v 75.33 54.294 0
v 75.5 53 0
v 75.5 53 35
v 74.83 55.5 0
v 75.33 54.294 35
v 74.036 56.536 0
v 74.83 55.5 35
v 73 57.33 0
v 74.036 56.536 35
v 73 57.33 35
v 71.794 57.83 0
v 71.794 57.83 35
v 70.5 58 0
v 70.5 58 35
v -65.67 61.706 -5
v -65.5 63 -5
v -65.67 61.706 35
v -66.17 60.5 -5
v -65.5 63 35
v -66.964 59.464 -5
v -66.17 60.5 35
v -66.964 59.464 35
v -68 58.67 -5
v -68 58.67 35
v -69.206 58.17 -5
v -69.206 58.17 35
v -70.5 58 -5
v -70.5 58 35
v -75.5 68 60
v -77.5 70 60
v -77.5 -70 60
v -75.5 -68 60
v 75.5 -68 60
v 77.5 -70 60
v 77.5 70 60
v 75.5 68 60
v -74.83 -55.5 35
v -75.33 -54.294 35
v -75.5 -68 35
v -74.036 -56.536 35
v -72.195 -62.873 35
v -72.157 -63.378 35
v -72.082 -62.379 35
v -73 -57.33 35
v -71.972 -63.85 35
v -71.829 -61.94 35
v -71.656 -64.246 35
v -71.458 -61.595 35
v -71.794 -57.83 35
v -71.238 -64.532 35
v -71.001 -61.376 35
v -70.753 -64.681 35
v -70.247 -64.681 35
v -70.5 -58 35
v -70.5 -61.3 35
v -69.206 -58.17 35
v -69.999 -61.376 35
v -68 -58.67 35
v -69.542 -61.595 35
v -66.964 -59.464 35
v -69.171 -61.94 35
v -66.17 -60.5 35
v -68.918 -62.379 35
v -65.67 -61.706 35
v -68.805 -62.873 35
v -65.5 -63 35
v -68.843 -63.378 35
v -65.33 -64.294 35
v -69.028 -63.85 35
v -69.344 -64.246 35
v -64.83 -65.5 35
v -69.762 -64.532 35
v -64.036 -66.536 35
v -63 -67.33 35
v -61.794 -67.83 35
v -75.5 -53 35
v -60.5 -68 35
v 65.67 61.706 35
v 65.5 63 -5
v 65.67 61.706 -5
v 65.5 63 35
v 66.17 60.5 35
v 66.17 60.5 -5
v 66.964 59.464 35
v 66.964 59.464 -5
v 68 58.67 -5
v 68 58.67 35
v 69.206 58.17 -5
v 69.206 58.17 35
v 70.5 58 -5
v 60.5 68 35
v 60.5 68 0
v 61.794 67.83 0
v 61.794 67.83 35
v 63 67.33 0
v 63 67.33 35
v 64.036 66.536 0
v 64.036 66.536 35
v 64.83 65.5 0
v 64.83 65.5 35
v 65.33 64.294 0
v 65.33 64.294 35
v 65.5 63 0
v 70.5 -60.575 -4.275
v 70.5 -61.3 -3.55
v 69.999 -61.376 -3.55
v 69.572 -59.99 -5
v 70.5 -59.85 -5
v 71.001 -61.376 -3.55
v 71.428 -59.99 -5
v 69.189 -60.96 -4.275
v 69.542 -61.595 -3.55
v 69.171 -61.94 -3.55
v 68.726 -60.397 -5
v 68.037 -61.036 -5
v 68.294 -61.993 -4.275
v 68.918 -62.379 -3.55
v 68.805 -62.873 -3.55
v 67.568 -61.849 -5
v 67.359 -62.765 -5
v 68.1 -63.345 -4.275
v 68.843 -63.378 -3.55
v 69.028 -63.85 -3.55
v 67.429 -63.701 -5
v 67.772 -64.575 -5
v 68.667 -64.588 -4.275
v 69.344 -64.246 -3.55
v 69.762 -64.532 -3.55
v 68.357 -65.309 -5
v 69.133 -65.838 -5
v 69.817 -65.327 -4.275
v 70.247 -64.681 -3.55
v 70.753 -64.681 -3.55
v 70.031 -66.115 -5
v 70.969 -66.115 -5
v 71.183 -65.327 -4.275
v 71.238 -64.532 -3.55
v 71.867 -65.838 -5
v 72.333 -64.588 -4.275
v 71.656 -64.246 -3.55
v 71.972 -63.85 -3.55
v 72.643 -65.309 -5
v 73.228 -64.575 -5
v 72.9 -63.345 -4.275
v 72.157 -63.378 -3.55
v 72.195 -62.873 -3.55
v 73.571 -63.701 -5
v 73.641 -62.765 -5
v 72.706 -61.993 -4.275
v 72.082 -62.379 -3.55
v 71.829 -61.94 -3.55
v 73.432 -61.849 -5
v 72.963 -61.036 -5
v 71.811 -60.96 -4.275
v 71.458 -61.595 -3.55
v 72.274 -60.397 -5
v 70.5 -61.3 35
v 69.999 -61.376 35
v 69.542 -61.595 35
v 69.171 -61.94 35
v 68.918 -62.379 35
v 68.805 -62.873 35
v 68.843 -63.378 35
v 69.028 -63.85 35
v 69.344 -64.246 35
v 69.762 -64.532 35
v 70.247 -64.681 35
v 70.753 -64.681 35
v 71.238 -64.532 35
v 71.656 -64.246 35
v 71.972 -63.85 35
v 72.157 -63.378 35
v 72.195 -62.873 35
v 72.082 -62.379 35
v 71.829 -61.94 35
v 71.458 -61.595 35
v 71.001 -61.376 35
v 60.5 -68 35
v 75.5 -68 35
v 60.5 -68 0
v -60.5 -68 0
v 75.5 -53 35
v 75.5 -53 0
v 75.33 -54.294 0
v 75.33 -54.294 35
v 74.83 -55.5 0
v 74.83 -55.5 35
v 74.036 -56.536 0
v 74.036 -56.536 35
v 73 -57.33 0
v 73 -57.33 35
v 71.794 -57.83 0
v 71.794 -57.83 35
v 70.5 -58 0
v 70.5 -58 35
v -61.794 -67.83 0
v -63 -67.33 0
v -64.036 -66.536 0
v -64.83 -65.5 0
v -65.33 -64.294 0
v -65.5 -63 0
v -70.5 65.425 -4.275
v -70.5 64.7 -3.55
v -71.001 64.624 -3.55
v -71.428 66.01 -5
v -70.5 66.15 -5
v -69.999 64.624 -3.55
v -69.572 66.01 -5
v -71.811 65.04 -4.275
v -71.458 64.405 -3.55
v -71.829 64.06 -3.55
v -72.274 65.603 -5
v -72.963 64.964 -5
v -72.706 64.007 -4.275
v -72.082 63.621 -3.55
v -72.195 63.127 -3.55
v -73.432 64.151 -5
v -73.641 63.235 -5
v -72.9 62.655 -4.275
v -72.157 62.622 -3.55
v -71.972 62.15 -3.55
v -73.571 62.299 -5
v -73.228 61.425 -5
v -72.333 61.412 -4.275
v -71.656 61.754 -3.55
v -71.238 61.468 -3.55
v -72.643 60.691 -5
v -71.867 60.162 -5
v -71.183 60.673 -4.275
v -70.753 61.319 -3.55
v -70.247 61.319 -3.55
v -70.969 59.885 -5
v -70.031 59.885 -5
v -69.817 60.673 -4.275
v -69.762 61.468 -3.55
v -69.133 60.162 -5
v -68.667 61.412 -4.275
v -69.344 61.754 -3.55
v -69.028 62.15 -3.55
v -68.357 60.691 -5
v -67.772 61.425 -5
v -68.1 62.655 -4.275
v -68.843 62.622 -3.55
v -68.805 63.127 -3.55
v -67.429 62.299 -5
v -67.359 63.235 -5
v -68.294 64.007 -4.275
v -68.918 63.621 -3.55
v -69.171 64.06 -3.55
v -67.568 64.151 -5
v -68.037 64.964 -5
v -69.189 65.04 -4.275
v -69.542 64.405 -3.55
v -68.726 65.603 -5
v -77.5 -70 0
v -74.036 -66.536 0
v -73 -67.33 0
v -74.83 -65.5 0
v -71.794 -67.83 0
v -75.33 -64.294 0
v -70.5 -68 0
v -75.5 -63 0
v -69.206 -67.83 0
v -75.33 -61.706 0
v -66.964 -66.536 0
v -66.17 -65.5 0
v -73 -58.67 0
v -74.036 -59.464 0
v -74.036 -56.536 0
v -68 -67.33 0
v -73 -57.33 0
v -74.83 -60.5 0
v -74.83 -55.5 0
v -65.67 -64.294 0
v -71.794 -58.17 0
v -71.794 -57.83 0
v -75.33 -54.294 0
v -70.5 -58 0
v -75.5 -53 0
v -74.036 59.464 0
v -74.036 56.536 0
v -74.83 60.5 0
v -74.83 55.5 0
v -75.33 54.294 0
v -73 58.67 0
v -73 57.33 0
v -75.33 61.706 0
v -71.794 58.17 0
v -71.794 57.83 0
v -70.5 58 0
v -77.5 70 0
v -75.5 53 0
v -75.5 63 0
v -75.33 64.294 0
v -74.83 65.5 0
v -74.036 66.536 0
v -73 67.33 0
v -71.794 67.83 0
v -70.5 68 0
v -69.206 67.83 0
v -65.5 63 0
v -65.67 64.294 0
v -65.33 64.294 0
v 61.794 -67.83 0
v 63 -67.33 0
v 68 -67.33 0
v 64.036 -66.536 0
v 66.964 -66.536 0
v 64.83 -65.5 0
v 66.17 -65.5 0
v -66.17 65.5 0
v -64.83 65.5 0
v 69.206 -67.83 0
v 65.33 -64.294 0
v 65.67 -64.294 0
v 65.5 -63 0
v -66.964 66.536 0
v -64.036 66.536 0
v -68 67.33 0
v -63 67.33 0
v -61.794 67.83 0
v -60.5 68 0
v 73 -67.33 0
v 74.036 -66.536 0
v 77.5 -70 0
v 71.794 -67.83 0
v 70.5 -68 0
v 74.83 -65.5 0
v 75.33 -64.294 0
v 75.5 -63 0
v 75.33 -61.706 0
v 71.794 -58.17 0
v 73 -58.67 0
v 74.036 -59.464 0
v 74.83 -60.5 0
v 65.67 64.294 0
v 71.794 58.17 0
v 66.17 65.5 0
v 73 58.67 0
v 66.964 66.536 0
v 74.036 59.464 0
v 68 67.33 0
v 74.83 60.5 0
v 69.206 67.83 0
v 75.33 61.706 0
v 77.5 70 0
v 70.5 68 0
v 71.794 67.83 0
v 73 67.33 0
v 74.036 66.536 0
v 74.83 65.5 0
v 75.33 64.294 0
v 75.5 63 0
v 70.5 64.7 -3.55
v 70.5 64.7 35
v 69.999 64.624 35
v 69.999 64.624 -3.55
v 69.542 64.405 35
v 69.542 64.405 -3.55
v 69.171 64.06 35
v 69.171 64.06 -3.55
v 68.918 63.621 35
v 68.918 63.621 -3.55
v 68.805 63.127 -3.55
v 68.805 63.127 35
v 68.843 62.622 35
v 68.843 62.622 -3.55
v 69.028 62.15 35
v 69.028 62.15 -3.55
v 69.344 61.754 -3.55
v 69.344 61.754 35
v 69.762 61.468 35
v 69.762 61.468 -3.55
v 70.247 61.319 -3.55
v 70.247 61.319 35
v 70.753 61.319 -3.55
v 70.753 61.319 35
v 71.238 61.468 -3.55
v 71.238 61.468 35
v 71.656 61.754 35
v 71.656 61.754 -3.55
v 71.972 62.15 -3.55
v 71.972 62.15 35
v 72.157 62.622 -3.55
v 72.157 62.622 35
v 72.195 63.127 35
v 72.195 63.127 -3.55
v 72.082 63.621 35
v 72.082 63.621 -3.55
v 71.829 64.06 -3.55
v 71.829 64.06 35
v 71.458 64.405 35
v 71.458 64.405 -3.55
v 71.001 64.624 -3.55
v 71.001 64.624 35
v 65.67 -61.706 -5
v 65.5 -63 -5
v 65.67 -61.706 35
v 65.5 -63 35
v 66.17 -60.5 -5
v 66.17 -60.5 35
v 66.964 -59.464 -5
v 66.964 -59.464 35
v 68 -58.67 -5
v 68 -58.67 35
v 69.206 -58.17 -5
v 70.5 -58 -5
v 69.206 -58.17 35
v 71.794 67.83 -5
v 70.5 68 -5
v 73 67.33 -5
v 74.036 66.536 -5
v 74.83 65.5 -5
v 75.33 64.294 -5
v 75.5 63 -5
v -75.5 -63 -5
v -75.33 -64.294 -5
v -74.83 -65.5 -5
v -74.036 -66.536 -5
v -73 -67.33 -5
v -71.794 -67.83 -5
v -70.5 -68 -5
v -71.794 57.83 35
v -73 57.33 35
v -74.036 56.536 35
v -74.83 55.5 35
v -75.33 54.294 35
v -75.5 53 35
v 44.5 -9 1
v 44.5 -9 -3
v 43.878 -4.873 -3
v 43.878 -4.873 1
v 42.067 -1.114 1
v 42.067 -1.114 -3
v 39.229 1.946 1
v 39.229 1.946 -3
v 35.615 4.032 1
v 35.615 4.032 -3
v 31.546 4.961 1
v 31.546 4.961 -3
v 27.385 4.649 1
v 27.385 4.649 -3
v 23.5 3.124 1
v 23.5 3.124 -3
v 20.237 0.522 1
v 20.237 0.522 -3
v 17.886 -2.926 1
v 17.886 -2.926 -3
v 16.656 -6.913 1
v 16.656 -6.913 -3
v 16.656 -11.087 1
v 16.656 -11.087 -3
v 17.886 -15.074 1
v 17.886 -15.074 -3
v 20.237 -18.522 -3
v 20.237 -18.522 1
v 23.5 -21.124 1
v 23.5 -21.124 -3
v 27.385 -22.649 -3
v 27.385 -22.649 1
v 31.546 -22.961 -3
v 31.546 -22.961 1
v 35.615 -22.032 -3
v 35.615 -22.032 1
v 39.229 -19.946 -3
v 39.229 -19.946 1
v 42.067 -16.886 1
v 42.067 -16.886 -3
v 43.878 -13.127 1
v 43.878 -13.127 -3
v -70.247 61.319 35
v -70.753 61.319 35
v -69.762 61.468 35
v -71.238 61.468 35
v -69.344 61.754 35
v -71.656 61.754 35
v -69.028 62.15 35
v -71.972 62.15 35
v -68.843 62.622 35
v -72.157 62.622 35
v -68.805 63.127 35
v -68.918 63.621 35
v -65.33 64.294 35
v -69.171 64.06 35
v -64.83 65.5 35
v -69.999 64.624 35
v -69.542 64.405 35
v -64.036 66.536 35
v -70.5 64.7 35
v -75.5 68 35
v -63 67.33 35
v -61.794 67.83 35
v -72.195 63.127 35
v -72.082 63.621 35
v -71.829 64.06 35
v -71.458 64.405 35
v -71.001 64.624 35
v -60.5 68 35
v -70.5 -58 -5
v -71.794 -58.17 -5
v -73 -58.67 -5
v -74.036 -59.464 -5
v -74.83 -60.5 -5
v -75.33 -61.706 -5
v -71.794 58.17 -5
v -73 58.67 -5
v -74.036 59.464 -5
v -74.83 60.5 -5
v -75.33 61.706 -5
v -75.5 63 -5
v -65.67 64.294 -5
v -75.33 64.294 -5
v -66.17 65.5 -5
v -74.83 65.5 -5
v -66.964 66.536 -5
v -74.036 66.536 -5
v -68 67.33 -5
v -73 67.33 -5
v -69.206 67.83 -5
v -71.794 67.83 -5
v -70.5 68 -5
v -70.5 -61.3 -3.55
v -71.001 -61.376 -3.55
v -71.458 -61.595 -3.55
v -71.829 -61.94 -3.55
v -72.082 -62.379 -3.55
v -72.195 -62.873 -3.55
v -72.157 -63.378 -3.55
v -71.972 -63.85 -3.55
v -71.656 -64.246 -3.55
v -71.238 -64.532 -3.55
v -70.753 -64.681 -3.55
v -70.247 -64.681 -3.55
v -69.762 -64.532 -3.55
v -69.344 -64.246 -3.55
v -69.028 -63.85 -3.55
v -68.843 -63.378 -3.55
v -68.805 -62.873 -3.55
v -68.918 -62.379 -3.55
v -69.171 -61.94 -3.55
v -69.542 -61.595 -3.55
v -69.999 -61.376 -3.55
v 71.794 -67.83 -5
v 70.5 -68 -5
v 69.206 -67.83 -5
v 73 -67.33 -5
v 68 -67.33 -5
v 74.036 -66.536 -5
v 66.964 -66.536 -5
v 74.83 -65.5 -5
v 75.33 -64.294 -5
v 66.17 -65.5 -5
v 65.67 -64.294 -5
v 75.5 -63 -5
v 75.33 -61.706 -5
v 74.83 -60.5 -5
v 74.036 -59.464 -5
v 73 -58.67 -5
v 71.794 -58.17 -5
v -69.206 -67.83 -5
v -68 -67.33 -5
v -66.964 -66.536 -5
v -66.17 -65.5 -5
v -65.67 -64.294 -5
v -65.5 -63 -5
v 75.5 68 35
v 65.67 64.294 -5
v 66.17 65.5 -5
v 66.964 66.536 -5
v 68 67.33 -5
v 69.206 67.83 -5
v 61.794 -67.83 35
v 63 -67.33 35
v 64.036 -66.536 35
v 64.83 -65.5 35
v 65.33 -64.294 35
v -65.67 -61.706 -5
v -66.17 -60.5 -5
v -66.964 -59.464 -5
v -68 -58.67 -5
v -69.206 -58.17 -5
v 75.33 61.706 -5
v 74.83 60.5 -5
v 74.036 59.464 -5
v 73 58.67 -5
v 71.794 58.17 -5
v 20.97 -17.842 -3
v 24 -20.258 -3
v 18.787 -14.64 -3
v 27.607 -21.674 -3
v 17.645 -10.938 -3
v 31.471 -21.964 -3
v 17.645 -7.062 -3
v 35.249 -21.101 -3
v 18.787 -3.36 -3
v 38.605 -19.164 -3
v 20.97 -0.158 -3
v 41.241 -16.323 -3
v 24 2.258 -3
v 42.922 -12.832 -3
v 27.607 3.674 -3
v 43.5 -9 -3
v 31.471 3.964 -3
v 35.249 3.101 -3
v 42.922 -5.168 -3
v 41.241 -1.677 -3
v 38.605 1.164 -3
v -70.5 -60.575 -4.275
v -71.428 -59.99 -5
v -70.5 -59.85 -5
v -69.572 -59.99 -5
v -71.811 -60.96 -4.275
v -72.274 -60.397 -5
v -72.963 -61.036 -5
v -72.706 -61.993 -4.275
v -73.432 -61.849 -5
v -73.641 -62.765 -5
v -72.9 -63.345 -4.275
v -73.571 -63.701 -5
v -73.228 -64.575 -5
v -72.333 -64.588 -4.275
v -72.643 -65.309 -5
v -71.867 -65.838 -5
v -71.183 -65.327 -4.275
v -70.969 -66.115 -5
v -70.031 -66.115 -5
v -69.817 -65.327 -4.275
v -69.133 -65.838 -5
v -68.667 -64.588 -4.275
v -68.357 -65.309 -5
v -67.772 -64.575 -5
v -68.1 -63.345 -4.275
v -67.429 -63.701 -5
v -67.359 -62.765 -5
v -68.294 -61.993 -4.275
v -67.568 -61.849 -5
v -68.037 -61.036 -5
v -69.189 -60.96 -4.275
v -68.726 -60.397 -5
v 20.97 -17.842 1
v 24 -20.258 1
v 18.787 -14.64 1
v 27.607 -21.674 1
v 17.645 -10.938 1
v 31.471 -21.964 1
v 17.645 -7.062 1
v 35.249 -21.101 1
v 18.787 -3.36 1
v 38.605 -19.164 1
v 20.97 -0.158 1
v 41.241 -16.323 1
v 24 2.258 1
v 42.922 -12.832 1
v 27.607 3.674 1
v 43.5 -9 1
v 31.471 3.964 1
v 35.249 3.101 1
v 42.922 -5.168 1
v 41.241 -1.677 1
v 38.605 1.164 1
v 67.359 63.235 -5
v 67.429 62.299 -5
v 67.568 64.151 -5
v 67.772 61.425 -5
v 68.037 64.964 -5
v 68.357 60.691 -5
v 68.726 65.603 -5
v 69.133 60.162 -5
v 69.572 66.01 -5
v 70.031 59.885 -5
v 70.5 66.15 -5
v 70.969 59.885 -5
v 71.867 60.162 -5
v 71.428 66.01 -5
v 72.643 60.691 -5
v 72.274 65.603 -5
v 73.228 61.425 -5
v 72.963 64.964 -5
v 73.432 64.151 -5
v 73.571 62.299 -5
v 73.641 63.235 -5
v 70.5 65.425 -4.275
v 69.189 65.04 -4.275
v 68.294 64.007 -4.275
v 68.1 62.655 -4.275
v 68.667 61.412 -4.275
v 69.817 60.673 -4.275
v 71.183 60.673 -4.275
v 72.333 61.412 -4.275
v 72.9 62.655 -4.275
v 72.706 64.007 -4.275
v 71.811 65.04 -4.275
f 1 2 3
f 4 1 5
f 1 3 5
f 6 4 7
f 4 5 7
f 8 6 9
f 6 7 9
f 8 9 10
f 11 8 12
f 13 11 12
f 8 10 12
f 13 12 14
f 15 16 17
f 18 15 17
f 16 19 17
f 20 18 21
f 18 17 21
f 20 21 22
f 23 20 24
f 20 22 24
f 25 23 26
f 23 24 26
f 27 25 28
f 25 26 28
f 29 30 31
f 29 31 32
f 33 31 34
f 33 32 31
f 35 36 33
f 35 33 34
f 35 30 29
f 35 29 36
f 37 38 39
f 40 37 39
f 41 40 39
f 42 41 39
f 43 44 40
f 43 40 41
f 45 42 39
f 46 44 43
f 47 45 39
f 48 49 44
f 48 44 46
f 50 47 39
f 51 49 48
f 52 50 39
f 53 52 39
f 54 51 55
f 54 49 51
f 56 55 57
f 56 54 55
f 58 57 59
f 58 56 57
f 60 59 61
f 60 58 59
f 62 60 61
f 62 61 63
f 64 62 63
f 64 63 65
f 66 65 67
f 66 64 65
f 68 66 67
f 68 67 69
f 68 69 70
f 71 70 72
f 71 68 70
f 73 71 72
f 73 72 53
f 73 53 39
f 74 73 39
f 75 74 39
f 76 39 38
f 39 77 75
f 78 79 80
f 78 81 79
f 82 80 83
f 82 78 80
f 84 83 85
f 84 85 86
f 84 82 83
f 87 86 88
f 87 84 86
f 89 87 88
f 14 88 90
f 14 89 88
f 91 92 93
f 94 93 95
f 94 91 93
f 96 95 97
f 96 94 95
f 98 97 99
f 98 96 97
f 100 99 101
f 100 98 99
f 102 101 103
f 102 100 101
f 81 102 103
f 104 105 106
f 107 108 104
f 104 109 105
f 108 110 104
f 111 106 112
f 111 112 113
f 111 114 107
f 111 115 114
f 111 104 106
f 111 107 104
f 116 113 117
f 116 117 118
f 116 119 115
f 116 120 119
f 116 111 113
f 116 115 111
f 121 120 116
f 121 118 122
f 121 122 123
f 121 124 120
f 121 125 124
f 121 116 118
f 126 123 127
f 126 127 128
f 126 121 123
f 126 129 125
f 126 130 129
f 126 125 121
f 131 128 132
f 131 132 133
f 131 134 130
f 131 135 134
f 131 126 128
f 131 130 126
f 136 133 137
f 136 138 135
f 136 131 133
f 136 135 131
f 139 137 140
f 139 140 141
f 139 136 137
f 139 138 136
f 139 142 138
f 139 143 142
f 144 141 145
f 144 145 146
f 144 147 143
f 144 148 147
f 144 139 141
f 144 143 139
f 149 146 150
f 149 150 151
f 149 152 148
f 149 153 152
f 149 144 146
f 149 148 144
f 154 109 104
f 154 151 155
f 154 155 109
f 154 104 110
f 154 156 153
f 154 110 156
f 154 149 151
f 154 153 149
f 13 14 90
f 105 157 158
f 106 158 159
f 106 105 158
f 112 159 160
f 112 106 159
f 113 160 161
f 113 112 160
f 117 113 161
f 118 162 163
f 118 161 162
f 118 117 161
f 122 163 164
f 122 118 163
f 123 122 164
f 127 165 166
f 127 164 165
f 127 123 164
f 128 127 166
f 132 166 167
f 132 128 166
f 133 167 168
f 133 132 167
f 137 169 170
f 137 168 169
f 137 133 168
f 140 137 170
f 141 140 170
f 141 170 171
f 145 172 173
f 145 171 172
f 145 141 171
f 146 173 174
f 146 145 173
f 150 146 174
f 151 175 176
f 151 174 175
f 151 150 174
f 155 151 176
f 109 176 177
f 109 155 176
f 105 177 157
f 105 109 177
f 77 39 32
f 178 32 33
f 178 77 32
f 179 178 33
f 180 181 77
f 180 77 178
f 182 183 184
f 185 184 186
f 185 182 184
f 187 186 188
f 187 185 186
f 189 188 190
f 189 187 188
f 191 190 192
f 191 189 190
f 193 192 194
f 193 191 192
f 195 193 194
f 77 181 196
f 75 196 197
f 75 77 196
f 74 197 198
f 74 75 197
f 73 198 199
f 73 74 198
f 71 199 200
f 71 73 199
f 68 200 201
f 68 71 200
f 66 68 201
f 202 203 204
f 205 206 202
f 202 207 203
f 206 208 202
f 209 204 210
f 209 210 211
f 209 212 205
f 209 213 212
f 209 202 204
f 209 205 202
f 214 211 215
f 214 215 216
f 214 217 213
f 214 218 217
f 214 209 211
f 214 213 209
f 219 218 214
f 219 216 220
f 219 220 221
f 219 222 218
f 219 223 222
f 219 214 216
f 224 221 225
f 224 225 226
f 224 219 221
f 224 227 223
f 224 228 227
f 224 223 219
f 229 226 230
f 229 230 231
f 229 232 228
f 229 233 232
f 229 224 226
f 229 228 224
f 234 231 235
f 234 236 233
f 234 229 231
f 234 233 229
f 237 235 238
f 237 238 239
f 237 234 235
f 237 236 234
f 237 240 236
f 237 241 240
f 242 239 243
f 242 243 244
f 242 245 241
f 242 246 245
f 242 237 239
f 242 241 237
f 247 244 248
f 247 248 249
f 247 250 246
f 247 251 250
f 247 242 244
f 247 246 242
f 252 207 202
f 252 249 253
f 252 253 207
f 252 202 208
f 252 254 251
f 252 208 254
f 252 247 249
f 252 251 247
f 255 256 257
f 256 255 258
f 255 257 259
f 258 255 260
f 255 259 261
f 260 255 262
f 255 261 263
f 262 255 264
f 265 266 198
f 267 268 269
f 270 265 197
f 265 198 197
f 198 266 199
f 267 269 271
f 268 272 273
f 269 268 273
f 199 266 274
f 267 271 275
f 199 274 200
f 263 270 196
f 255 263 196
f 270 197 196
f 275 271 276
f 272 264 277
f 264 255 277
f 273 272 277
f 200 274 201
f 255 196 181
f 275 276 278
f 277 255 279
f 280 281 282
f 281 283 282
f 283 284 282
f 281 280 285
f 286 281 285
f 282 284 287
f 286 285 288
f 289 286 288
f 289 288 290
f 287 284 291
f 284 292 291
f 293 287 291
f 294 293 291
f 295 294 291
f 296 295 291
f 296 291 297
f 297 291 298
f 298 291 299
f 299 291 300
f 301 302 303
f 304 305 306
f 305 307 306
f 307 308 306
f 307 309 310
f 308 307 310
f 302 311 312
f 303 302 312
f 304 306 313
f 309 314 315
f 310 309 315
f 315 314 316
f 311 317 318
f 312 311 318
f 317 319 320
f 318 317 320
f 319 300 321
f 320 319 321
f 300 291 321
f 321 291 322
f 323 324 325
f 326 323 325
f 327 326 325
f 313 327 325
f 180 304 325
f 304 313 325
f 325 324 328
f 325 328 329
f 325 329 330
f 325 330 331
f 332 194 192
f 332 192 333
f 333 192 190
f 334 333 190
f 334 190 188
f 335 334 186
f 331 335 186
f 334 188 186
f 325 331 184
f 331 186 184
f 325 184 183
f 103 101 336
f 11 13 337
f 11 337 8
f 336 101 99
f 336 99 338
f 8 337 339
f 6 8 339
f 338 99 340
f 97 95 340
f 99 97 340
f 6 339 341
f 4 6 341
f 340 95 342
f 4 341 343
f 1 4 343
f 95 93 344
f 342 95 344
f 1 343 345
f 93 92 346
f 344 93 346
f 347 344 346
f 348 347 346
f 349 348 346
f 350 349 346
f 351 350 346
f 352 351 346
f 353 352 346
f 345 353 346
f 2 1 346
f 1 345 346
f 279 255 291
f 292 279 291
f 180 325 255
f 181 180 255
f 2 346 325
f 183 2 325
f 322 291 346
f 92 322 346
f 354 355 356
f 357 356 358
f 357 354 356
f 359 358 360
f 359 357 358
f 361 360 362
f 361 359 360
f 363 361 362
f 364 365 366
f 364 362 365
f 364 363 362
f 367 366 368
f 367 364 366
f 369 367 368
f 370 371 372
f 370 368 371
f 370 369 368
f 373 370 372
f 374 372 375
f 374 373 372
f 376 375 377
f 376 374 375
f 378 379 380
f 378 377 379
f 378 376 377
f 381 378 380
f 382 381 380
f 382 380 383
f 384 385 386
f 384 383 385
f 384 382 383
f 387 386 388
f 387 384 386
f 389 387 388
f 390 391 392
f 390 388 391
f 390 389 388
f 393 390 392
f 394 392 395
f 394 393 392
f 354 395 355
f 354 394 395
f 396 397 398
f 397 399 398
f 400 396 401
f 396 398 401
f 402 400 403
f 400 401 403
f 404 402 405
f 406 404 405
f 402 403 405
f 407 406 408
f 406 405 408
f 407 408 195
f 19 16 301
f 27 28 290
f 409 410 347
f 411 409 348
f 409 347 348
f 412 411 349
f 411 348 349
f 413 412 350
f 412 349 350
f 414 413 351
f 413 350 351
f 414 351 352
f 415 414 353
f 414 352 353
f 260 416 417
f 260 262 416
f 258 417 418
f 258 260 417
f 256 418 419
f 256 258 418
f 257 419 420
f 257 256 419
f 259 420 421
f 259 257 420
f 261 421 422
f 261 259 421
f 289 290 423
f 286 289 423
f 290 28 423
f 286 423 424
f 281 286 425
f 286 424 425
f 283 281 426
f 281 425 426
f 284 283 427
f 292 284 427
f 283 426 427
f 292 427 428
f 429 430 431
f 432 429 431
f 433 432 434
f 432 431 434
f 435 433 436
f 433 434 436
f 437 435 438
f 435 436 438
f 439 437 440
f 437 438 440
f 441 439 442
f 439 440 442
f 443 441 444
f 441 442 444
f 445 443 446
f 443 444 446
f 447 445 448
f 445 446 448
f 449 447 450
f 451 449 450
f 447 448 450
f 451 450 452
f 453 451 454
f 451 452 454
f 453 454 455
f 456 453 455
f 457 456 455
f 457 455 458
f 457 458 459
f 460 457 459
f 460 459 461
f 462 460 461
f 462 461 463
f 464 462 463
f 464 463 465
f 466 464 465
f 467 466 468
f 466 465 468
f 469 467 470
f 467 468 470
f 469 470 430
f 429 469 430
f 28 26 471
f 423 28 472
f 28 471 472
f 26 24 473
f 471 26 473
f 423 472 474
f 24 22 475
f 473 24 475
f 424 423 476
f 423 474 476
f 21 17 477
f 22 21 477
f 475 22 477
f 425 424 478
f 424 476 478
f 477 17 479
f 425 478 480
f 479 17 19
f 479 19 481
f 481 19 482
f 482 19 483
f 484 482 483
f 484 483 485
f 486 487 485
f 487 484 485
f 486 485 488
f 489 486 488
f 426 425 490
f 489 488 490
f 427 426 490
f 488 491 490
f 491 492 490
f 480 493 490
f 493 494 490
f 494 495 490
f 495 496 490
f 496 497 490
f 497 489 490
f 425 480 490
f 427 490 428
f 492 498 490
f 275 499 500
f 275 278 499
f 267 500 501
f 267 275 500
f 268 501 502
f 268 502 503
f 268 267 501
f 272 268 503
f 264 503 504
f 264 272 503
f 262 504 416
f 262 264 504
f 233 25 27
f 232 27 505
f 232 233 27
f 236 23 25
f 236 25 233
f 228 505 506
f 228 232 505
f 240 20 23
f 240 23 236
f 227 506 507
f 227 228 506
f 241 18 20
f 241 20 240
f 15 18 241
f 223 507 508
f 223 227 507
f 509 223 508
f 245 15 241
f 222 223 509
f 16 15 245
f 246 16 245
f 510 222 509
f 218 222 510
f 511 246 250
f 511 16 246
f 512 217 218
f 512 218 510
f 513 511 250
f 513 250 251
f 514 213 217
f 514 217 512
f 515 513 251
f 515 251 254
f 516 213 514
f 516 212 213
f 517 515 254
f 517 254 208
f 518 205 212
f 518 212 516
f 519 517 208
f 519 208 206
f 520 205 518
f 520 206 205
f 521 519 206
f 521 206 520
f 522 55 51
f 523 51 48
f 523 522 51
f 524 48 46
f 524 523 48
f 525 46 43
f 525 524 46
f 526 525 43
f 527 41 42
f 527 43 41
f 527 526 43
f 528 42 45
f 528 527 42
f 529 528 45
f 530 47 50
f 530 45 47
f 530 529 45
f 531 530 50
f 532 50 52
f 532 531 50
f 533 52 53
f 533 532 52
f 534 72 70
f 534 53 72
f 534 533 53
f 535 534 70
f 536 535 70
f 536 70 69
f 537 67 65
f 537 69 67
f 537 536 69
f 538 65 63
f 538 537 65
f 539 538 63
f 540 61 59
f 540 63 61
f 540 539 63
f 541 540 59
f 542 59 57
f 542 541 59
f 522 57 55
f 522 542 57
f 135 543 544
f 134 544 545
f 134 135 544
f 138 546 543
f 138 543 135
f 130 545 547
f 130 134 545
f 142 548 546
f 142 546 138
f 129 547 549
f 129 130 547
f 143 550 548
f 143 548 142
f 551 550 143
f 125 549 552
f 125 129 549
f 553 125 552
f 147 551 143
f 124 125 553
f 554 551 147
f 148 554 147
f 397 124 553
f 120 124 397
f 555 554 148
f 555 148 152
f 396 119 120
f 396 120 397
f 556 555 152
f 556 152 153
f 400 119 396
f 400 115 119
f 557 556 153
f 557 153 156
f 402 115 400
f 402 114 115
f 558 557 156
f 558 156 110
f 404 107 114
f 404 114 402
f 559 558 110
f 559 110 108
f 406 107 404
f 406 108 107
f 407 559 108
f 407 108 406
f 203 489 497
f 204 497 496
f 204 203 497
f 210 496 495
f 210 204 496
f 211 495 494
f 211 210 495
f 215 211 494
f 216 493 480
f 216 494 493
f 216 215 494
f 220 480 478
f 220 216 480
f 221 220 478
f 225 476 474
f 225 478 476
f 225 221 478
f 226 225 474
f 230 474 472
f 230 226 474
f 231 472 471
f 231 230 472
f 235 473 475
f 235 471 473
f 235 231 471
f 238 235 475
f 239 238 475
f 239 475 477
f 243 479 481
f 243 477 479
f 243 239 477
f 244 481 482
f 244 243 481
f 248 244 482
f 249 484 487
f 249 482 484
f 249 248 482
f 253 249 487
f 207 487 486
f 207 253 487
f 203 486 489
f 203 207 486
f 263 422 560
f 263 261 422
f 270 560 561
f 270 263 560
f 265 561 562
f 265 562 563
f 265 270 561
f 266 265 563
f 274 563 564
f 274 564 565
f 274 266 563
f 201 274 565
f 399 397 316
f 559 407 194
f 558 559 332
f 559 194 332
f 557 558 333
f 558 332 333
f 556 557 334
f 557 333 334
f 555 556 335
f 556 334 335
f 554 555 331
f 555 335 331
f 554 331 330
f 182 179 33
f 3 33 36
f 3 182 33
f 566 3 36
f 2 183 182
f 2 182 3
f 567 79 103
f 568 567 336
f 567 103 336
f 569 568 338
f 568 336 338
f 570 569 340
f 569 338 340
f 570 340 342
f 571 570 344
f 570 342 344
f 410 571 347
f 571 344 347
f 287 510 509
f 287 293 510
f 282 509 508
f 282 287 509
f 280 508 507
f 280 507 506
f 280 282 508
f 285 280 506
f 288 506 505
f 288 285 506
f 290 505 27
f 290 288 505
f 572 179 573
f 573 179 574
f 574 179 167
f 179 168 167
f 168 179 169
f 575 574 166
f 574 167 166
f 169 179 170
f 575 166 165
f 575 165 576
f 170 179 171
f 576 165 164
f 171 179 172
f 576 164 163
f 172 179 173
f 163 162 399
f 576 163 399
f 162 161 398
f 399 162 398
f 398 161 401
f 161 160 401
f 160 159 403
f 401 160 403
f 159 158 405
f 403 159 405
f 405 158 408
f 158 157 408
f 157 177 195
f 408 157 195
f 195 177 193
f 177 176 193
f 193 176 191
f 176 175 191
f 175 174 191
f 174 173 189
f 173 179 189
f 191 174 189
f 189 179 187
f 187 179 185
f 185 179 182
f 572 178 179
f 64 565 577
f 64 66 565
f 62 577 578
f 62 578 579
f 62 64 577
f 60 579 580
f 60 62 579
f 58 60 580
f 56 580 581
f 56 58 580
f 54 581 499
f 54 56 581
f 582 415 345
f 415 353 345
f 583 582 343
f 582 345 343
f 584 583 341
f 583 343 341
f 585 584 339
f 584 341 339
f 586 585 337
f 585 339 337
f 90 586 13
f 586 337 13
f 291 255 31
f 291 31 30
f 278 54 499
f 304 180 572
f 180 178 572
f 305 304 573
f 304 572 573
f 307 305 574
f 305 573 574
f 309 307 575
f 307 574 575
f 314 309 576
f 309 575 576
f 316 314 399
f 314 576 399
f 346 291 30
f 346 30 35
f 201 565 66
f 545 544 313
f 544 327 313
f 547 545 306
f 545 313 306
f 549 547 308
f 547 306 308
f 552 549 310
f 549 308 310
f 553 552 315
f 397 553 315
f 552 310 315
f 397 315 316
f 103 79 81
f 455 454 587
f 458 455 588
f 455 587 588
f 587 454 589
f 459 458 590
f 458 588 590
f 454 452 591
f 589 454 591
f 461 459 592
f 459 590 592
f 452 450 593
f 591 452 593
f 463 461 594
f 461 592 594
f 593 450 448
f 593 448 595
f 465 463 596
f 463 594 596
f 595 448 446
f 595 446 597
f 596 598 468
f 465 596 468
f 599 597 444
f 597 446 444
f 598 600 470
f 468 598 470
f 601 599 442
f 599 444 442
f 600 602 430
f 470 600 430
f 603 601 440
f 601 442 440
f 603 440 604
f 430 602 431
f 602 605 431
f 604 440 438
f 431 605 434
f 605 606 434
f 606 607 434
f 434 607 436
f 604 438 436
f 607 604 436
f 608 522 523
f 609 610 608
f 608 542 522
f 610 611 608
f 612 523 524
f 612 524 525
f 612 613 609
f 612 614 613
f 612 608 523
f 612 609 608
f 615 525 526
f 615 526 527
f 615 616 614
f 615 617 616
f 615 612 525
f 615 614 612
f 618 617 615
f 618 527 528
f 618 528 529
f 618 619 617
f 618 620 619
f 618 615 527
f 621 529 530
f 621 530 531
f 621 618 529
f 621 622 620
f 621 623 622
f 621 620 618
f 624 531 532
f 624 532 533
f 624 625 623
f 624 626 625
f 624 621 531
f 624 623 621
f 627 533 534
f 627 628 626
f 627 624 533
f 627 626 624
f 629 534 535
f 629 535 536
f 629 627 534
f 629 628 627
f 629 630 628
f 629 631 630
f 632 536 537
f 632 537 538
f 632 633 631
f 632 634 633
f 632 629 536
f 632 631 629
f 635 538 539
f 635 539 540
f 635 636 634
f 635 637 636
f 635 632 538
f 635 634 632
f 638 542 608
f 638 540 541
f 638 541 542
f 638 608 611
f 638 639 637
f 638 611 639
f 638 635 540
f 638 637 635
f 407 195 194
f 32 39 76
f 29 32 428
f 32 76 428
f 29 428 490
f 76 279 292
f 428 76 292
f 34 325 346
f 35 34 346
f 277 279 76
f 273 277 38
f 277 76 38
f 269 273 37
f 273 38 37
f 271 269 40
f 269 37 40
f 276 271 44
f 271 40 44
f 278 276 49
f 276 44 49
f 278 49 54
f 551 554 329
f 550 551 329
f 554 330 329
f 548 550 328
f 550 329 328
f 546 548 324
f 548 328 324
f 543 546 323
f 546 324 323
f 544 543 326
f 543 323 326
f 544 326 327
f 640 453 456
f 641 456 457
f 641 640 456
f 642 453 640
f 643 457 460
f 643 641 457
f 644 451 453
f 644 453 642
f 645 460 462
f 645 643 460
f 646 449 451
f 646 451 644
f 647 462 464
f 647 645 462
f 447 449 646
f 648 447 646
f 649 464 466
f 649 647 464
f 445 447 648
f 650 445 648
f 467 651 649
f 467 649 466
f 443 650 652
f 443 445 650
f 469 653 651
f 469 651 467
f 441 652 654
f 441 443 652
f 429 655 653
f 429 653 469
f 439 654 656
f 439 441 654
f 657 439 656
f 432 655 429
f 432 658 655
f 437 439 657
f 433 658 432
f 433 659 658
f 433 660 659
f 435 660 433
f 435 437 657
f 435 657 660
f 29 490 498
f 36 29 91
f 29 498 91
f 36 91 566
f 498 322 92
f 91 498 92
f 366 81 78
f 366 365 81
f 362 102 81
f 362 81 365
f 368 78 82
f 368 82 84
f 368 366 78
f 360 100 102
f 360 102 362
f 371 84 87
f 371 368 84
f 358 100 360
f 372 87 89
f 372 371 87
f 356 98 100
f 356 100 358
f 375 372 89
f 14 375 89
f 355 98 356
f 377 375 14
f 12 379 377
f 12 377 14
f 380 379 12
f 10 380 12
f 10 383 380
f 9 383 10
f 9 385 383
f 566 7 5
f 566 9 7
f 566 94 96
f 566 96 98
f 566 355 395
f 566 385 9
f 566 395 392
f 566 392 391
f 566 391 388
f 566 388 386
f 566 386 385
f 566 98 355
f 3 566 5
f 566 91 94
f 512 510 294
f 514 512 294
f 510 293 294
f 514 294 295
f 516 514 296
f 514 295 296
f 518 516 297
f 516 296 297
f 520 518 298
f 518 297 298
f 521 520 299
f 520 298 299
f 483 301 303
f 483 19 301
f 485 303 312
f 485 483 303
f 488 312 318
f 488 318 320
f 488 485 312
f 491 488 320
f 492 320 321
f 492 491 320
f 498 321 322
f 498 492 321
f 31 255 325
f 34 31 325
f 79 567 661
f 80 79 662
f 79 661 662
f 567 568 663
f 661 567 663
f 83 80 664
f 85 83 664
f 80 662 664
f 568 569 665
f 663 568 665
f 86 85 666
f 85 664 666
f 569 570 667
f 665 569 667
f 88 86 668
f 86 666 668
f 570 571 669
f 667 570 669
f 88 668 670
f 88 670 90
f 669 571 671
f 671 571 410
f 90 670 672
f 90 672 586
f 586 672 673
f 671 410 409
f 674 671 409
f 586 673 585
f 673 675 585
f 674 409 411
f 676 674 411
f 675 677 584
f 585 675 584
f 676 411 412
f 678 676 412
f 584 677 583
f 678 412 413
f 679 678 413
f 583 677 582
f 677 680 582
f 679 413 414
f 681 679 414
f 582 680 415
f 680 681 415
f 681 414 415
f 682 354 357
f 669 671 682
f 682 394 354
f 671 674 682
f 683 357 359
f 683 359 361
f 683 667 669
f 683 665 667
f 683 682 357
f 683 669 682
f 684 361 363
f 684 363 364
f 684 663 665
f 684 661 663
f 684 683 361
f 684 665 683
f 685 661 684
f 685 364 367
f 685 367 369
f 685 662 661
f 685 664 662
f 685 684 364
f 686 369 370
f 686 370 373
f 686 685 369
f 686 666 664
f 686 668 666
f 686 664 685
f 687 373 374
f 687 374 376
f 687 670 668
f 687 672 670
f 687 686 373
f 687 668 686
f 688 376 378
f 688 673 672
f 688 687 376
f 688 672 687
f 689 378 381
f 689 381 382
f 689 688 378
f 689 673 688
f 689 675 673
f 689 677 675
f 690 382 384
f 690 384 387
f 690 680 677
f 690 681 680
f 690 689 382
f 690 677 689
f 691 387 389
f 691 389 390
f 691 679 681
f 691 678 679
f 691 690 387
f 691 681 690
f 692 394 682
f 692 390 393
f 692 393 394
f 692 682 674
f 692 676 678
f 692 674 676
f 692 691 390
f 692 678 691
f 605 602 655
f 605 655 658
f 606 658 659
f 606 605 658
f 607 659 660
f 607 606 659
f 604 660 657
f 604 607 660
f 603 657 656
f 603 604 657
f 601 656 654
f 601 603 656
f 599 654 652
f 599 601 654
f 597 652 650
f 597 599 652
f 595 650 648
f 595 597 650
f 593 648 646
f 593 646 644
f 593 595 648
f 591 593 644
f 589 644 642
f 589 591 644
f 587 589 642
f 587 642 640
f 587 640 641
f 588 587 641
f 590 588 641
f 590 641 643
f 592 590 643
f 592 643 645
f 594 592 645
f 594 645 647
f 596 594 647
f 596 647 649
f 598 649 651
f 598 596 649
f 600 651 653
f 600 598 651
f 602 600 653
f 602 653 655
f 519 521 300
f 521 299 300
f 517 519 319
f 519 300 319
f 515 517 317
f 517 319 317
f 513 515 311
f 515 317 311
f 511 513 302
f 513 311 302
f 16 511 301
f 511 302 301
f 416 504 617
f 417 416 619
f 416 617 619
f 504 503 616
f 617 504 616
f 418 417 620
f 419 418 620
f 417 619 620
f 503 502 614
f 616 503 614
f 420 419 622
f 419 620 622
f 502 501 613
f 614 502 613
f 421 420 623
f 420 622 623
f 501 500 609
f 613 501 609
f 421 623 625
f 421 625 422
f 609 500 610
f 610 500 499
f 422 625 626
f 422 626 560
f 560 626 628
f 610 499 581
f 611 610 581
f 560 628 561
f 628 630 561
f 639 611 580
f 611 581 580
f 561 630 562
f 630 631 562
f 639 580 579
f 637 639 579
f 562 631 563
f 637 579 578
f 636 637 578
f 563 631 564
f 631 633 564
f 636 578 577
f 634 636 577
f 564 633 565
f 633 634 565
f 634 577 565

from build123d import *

# Parameters (mm, degrees)
SKIZZE1_W                                      = 155
SKIZZE1_H                                      = 140
SKIZZE1_W_2                                    = 151
SKIZZE1_H_2                                    = 136
AUFSATZ_LINEAR_AUSTRAGEN2_DEPTH                = 60
AUFSATZ_LINEAR_START                           = -3
AUFSATZ_LINEAR_AUSTRAGEN6_OUTLINE_R            = 14
AUFSATZ_LINEAR_AUSTRAGEN6_OUTLINE_R_2          = 13
AUFSATZ_LINEAR_AUSTRAGEN6_DEPTH                = 4
AUFSATZ_LINEAR_AUSTRAGEN8_DEPTH                = 25
AUFSATZ_LINEAR_AUSTRAGEN8_DEPTH_BACK           = 15
VERRUNDUNG17_R                                 = 5
VERRUNDUNG18_R                                 = 5
FORMSENKUNG_F_R_M3_LINSENSENKSCHRAUBE1_A_COUNT = 2
FORMSENKUNG_F_R_M3_LINSENSENKSCHRAUBE1_A_PITCH = 126
FORMSENKUNG_F_R_M3_LINSENSENKSCHRAUB_2_COUNT   = 2
FORMSENKUNG_F_R_M3_LINSENSENKSCHRAUB_2_PITCH   = 189.0952141118331
FORMSENKUNG_F_R_M3_LINSENSENKSCHRAUB_3_COUNT   = 2
FORMSENKUNG_F_R_M3_LINSENSENKSCHRAUB_3_PITCH   = 141


# Read off the part's stored shape, not the designer's step: Aufsatz-Linear austragen6
with BuildPart() as part:
    # Skizze1 → Aufsatz-Linear austragen2 (new body)
    with BuildSketch(Plane.XY):
        Rectangle(SKIZZE1_W, SKIZZE1_H)
        Rectangle(SKIZZE1_W_2, SKIZZE1_H_2, mode=Mode.SUBTRACT)
    extrude(amount=AUFSATZ_LINEAR_AUSTRAGEN2_DEPTH)

    # 3D-Skizze1 → Aufsatz-Linear austragen8 (add, two sides: drawn at the far end of the back side and taken through both)
    with BuildSketch(Plane(origin=(-75.50000000000003, 67.99999999999999, 10.000000000000002), x_dir=(0.7430494130276538, -0.6692365574288803, 0), z_dir=(0, 0, 1)).offset(-AUFSATZ_LINEAR_AUSTRAGEN8_DEPTH_BACK)):
        Polygon((0, 0), (7.430494130276535, 6.6923655742888), (14.122859704565338, -0.7381285559877395), (6.692365574288805, -7.43049413027654), align=None)
        Polygon((112.20046136717572, 101.05472017176092), (104.7699672368992, 94.36235459747213), (111.462332811188, 86.9318604671956), (118.89282694146452, 93.62422604148439), align=None)
        Polygon((203.21663317750344, 0), (195.78613904722692, -6.692365574288789), (189.09377347293812, 0.7381285559877604), (196.52426760321464, 7.430494130276549), align=None)
        Polygon((91.01617181032773, -101.05472017176092), (98.44666594060426, -94.36235459747212), (91.75430036631546, -86.93186046719558), (84.32380623603892, -93.62422604148438), align=None)
    extrude(amount=AUFSATZ_LINEAR_AUSTRAGEN8_DEPTH + AUFSATZ_LINEAR_AUSTRAGEN8_DEPTH_BACK)

    # Verrundung17
    verrundung17_edges = [part.edges().sort_by_distance(p)[0] for p in [
        (75.49999999999994, 58, 17.5),
        (65.49999999999997, 58, 15.000000000000002),
        (65.49999999999997, 67.99999999999999, 17.5),
        (-65.50000000000003, 67.99999999999999, 17.5),
        (-65.50000000000003, 57.999999999999986, 15),
        (-75.50000000000003, 57.999999999999986, 17.5),
        (-75.50000000000003, -57.999999999999986, 17.5),
        (-65.50000000000003, -68.00000000000001, 17.5),
        (-65.50000000000003, -58, 15.000000000000002),
        (65.49999999999997, -68.00000000000001, 17.5),
        (75.49999999999994, -58, 17.5),
        (65.5, -58, 15),
    ]]
    fillet(verrundung17_edges, radius=VERRUNDUNG17_R - 0.0001)  # a hair under: the kernel refuses the full size

    # Verrundung18
    verrundung18_edges = [part.edges().sort_by_distance(p)[0] for p in [
        (65.49999999999997, 67.99999999999999, -2.499999999999999),
        (75.49999999999994, 67.99999999999999, -2.5),
        (75.49999999999994, 58, -2.5),
        (-75.50000000000003, -57.999999999999986, -2.5),
        (-65.50000000000003, 67.99999999999999, -2.5),
        (-75.50000000000003, 67.99999999999999, -2.499999999999999),
        (-75.50000000000003, 57.999999999999986, -2.499999999999999),
        (-75.50000000000001, -68.00000000000001, -2.5),
        (-65.50000000000003, -68.00000000000001, -2.499999999999999),
        (65.49999999999997, -68.00000000000001, -2.5),
        (75.49999999999994, -58, -2.499999999999999),
        (75.49999999999994, -68.00000000000001, -2.499999999999999),
    ]]
    fillet(verrundung18_edges, radius=VERRUNDUNG18_R - 0.0001)  # a hair under: the kernel refuses the full size

    # Skizze18 → Formsenkung für M3 Linsensenkschraube1 (revolve, cut)
    with BuildSketch(Plane(origin=(70.49999999999999, -63.000000000000014, -4.999999999999999), x_dir=(0, 1, 0), z_dir=(1, 0, 0))):
        Polygon((0, 0), (-9.8e-15, 40.00110307764064), (1.69999999999999, 40.00110307764064), (1.6999999999999953, 1.45), (3.15, 0), align=None)
    formsenkung_f_r_m3_linsensenkschraube1 = revolve(axis=Axis((70.49999999999999, -63.000000000000014, -11.34999999999999), (0, 0, 1)), mode=Mode.SUBTRACT)

    # Formsenkung für M3 Linsensenkschraube1 a: Formsenkung für M3 Linsensenkschraube1 ×2
    with Locations(*[(0, i * FORMSENKUNG_F_R_M3_LINSENSENKSCHRAUBE1_A_PITCH, 0) for i in range(1, FORMSENKUNG_F_R_M3_LINSENSENKSCHRAUBE1_A_COUNT)]):
        add(formsenkung_f_r_m3_linsensenkschraube1, mode=Mode.SUBTRACT)

    # Formsenkung f_r M3 Linsensenkschraub 2: Formsenkung für M3 Linsensenkschraube1 ×2
    with Locations(*[Vector(-0.7456561006171789, 0.666330983530245, 0) * (i * FORMSENKUNG_F_R_M3_LINSENSENKSCHRAUB_2_PITCH) for i in range(1, FORMSENKUNG_F_R_M3_LINSENSENKSCHRAUB_2_COUNT)]):
        add(formsenkung_f_r_m3_linsensenkschraube1, mode=Mode.SUBTRACT)

    # Formsenkung f_r M3 Linsensenkschraub 3: Formsenkung für M3 Linsensenkschraube1 ×2
    with Locations(*[(-i * FORMSENKUNG_F_R_M3_LINSENSENKSCHRAUB_3_PITCH, 0, 0) for i in range(1, FORMSENKUNG_F_R_M3_LINSENSENKSCHRAUB_3_COUNT)]):
        add(formsenkung_f_r_m3_linsensenkschraube1, mode=Mode.SUBTRACT)


with BuildPart() as body_2:
    # Aufsatz-Linear austragen6 outline → Aufsatz-Linear austragen6 (new body)
    with BuildSketch(Plane.XY.offset(AUFSATZ_LINEAR_START)):
        with Locations((30.5, -9)):
            Circle(AUFSATZ_LINEAR_AUSTRAGEN6_OUTLINE_R)
        with Locations((30.5, -9)):
            Circle(AUFSATZ_LINEAR_AUSTRAGEN6_OUTLINE_R_2, mode=Mode.SUBTRACT)
    extrude(amount=AUFSATZ_LINEAR_AUSTRAGEN6_DEPTH)


solid = Compound([part.part, body_2.part])
